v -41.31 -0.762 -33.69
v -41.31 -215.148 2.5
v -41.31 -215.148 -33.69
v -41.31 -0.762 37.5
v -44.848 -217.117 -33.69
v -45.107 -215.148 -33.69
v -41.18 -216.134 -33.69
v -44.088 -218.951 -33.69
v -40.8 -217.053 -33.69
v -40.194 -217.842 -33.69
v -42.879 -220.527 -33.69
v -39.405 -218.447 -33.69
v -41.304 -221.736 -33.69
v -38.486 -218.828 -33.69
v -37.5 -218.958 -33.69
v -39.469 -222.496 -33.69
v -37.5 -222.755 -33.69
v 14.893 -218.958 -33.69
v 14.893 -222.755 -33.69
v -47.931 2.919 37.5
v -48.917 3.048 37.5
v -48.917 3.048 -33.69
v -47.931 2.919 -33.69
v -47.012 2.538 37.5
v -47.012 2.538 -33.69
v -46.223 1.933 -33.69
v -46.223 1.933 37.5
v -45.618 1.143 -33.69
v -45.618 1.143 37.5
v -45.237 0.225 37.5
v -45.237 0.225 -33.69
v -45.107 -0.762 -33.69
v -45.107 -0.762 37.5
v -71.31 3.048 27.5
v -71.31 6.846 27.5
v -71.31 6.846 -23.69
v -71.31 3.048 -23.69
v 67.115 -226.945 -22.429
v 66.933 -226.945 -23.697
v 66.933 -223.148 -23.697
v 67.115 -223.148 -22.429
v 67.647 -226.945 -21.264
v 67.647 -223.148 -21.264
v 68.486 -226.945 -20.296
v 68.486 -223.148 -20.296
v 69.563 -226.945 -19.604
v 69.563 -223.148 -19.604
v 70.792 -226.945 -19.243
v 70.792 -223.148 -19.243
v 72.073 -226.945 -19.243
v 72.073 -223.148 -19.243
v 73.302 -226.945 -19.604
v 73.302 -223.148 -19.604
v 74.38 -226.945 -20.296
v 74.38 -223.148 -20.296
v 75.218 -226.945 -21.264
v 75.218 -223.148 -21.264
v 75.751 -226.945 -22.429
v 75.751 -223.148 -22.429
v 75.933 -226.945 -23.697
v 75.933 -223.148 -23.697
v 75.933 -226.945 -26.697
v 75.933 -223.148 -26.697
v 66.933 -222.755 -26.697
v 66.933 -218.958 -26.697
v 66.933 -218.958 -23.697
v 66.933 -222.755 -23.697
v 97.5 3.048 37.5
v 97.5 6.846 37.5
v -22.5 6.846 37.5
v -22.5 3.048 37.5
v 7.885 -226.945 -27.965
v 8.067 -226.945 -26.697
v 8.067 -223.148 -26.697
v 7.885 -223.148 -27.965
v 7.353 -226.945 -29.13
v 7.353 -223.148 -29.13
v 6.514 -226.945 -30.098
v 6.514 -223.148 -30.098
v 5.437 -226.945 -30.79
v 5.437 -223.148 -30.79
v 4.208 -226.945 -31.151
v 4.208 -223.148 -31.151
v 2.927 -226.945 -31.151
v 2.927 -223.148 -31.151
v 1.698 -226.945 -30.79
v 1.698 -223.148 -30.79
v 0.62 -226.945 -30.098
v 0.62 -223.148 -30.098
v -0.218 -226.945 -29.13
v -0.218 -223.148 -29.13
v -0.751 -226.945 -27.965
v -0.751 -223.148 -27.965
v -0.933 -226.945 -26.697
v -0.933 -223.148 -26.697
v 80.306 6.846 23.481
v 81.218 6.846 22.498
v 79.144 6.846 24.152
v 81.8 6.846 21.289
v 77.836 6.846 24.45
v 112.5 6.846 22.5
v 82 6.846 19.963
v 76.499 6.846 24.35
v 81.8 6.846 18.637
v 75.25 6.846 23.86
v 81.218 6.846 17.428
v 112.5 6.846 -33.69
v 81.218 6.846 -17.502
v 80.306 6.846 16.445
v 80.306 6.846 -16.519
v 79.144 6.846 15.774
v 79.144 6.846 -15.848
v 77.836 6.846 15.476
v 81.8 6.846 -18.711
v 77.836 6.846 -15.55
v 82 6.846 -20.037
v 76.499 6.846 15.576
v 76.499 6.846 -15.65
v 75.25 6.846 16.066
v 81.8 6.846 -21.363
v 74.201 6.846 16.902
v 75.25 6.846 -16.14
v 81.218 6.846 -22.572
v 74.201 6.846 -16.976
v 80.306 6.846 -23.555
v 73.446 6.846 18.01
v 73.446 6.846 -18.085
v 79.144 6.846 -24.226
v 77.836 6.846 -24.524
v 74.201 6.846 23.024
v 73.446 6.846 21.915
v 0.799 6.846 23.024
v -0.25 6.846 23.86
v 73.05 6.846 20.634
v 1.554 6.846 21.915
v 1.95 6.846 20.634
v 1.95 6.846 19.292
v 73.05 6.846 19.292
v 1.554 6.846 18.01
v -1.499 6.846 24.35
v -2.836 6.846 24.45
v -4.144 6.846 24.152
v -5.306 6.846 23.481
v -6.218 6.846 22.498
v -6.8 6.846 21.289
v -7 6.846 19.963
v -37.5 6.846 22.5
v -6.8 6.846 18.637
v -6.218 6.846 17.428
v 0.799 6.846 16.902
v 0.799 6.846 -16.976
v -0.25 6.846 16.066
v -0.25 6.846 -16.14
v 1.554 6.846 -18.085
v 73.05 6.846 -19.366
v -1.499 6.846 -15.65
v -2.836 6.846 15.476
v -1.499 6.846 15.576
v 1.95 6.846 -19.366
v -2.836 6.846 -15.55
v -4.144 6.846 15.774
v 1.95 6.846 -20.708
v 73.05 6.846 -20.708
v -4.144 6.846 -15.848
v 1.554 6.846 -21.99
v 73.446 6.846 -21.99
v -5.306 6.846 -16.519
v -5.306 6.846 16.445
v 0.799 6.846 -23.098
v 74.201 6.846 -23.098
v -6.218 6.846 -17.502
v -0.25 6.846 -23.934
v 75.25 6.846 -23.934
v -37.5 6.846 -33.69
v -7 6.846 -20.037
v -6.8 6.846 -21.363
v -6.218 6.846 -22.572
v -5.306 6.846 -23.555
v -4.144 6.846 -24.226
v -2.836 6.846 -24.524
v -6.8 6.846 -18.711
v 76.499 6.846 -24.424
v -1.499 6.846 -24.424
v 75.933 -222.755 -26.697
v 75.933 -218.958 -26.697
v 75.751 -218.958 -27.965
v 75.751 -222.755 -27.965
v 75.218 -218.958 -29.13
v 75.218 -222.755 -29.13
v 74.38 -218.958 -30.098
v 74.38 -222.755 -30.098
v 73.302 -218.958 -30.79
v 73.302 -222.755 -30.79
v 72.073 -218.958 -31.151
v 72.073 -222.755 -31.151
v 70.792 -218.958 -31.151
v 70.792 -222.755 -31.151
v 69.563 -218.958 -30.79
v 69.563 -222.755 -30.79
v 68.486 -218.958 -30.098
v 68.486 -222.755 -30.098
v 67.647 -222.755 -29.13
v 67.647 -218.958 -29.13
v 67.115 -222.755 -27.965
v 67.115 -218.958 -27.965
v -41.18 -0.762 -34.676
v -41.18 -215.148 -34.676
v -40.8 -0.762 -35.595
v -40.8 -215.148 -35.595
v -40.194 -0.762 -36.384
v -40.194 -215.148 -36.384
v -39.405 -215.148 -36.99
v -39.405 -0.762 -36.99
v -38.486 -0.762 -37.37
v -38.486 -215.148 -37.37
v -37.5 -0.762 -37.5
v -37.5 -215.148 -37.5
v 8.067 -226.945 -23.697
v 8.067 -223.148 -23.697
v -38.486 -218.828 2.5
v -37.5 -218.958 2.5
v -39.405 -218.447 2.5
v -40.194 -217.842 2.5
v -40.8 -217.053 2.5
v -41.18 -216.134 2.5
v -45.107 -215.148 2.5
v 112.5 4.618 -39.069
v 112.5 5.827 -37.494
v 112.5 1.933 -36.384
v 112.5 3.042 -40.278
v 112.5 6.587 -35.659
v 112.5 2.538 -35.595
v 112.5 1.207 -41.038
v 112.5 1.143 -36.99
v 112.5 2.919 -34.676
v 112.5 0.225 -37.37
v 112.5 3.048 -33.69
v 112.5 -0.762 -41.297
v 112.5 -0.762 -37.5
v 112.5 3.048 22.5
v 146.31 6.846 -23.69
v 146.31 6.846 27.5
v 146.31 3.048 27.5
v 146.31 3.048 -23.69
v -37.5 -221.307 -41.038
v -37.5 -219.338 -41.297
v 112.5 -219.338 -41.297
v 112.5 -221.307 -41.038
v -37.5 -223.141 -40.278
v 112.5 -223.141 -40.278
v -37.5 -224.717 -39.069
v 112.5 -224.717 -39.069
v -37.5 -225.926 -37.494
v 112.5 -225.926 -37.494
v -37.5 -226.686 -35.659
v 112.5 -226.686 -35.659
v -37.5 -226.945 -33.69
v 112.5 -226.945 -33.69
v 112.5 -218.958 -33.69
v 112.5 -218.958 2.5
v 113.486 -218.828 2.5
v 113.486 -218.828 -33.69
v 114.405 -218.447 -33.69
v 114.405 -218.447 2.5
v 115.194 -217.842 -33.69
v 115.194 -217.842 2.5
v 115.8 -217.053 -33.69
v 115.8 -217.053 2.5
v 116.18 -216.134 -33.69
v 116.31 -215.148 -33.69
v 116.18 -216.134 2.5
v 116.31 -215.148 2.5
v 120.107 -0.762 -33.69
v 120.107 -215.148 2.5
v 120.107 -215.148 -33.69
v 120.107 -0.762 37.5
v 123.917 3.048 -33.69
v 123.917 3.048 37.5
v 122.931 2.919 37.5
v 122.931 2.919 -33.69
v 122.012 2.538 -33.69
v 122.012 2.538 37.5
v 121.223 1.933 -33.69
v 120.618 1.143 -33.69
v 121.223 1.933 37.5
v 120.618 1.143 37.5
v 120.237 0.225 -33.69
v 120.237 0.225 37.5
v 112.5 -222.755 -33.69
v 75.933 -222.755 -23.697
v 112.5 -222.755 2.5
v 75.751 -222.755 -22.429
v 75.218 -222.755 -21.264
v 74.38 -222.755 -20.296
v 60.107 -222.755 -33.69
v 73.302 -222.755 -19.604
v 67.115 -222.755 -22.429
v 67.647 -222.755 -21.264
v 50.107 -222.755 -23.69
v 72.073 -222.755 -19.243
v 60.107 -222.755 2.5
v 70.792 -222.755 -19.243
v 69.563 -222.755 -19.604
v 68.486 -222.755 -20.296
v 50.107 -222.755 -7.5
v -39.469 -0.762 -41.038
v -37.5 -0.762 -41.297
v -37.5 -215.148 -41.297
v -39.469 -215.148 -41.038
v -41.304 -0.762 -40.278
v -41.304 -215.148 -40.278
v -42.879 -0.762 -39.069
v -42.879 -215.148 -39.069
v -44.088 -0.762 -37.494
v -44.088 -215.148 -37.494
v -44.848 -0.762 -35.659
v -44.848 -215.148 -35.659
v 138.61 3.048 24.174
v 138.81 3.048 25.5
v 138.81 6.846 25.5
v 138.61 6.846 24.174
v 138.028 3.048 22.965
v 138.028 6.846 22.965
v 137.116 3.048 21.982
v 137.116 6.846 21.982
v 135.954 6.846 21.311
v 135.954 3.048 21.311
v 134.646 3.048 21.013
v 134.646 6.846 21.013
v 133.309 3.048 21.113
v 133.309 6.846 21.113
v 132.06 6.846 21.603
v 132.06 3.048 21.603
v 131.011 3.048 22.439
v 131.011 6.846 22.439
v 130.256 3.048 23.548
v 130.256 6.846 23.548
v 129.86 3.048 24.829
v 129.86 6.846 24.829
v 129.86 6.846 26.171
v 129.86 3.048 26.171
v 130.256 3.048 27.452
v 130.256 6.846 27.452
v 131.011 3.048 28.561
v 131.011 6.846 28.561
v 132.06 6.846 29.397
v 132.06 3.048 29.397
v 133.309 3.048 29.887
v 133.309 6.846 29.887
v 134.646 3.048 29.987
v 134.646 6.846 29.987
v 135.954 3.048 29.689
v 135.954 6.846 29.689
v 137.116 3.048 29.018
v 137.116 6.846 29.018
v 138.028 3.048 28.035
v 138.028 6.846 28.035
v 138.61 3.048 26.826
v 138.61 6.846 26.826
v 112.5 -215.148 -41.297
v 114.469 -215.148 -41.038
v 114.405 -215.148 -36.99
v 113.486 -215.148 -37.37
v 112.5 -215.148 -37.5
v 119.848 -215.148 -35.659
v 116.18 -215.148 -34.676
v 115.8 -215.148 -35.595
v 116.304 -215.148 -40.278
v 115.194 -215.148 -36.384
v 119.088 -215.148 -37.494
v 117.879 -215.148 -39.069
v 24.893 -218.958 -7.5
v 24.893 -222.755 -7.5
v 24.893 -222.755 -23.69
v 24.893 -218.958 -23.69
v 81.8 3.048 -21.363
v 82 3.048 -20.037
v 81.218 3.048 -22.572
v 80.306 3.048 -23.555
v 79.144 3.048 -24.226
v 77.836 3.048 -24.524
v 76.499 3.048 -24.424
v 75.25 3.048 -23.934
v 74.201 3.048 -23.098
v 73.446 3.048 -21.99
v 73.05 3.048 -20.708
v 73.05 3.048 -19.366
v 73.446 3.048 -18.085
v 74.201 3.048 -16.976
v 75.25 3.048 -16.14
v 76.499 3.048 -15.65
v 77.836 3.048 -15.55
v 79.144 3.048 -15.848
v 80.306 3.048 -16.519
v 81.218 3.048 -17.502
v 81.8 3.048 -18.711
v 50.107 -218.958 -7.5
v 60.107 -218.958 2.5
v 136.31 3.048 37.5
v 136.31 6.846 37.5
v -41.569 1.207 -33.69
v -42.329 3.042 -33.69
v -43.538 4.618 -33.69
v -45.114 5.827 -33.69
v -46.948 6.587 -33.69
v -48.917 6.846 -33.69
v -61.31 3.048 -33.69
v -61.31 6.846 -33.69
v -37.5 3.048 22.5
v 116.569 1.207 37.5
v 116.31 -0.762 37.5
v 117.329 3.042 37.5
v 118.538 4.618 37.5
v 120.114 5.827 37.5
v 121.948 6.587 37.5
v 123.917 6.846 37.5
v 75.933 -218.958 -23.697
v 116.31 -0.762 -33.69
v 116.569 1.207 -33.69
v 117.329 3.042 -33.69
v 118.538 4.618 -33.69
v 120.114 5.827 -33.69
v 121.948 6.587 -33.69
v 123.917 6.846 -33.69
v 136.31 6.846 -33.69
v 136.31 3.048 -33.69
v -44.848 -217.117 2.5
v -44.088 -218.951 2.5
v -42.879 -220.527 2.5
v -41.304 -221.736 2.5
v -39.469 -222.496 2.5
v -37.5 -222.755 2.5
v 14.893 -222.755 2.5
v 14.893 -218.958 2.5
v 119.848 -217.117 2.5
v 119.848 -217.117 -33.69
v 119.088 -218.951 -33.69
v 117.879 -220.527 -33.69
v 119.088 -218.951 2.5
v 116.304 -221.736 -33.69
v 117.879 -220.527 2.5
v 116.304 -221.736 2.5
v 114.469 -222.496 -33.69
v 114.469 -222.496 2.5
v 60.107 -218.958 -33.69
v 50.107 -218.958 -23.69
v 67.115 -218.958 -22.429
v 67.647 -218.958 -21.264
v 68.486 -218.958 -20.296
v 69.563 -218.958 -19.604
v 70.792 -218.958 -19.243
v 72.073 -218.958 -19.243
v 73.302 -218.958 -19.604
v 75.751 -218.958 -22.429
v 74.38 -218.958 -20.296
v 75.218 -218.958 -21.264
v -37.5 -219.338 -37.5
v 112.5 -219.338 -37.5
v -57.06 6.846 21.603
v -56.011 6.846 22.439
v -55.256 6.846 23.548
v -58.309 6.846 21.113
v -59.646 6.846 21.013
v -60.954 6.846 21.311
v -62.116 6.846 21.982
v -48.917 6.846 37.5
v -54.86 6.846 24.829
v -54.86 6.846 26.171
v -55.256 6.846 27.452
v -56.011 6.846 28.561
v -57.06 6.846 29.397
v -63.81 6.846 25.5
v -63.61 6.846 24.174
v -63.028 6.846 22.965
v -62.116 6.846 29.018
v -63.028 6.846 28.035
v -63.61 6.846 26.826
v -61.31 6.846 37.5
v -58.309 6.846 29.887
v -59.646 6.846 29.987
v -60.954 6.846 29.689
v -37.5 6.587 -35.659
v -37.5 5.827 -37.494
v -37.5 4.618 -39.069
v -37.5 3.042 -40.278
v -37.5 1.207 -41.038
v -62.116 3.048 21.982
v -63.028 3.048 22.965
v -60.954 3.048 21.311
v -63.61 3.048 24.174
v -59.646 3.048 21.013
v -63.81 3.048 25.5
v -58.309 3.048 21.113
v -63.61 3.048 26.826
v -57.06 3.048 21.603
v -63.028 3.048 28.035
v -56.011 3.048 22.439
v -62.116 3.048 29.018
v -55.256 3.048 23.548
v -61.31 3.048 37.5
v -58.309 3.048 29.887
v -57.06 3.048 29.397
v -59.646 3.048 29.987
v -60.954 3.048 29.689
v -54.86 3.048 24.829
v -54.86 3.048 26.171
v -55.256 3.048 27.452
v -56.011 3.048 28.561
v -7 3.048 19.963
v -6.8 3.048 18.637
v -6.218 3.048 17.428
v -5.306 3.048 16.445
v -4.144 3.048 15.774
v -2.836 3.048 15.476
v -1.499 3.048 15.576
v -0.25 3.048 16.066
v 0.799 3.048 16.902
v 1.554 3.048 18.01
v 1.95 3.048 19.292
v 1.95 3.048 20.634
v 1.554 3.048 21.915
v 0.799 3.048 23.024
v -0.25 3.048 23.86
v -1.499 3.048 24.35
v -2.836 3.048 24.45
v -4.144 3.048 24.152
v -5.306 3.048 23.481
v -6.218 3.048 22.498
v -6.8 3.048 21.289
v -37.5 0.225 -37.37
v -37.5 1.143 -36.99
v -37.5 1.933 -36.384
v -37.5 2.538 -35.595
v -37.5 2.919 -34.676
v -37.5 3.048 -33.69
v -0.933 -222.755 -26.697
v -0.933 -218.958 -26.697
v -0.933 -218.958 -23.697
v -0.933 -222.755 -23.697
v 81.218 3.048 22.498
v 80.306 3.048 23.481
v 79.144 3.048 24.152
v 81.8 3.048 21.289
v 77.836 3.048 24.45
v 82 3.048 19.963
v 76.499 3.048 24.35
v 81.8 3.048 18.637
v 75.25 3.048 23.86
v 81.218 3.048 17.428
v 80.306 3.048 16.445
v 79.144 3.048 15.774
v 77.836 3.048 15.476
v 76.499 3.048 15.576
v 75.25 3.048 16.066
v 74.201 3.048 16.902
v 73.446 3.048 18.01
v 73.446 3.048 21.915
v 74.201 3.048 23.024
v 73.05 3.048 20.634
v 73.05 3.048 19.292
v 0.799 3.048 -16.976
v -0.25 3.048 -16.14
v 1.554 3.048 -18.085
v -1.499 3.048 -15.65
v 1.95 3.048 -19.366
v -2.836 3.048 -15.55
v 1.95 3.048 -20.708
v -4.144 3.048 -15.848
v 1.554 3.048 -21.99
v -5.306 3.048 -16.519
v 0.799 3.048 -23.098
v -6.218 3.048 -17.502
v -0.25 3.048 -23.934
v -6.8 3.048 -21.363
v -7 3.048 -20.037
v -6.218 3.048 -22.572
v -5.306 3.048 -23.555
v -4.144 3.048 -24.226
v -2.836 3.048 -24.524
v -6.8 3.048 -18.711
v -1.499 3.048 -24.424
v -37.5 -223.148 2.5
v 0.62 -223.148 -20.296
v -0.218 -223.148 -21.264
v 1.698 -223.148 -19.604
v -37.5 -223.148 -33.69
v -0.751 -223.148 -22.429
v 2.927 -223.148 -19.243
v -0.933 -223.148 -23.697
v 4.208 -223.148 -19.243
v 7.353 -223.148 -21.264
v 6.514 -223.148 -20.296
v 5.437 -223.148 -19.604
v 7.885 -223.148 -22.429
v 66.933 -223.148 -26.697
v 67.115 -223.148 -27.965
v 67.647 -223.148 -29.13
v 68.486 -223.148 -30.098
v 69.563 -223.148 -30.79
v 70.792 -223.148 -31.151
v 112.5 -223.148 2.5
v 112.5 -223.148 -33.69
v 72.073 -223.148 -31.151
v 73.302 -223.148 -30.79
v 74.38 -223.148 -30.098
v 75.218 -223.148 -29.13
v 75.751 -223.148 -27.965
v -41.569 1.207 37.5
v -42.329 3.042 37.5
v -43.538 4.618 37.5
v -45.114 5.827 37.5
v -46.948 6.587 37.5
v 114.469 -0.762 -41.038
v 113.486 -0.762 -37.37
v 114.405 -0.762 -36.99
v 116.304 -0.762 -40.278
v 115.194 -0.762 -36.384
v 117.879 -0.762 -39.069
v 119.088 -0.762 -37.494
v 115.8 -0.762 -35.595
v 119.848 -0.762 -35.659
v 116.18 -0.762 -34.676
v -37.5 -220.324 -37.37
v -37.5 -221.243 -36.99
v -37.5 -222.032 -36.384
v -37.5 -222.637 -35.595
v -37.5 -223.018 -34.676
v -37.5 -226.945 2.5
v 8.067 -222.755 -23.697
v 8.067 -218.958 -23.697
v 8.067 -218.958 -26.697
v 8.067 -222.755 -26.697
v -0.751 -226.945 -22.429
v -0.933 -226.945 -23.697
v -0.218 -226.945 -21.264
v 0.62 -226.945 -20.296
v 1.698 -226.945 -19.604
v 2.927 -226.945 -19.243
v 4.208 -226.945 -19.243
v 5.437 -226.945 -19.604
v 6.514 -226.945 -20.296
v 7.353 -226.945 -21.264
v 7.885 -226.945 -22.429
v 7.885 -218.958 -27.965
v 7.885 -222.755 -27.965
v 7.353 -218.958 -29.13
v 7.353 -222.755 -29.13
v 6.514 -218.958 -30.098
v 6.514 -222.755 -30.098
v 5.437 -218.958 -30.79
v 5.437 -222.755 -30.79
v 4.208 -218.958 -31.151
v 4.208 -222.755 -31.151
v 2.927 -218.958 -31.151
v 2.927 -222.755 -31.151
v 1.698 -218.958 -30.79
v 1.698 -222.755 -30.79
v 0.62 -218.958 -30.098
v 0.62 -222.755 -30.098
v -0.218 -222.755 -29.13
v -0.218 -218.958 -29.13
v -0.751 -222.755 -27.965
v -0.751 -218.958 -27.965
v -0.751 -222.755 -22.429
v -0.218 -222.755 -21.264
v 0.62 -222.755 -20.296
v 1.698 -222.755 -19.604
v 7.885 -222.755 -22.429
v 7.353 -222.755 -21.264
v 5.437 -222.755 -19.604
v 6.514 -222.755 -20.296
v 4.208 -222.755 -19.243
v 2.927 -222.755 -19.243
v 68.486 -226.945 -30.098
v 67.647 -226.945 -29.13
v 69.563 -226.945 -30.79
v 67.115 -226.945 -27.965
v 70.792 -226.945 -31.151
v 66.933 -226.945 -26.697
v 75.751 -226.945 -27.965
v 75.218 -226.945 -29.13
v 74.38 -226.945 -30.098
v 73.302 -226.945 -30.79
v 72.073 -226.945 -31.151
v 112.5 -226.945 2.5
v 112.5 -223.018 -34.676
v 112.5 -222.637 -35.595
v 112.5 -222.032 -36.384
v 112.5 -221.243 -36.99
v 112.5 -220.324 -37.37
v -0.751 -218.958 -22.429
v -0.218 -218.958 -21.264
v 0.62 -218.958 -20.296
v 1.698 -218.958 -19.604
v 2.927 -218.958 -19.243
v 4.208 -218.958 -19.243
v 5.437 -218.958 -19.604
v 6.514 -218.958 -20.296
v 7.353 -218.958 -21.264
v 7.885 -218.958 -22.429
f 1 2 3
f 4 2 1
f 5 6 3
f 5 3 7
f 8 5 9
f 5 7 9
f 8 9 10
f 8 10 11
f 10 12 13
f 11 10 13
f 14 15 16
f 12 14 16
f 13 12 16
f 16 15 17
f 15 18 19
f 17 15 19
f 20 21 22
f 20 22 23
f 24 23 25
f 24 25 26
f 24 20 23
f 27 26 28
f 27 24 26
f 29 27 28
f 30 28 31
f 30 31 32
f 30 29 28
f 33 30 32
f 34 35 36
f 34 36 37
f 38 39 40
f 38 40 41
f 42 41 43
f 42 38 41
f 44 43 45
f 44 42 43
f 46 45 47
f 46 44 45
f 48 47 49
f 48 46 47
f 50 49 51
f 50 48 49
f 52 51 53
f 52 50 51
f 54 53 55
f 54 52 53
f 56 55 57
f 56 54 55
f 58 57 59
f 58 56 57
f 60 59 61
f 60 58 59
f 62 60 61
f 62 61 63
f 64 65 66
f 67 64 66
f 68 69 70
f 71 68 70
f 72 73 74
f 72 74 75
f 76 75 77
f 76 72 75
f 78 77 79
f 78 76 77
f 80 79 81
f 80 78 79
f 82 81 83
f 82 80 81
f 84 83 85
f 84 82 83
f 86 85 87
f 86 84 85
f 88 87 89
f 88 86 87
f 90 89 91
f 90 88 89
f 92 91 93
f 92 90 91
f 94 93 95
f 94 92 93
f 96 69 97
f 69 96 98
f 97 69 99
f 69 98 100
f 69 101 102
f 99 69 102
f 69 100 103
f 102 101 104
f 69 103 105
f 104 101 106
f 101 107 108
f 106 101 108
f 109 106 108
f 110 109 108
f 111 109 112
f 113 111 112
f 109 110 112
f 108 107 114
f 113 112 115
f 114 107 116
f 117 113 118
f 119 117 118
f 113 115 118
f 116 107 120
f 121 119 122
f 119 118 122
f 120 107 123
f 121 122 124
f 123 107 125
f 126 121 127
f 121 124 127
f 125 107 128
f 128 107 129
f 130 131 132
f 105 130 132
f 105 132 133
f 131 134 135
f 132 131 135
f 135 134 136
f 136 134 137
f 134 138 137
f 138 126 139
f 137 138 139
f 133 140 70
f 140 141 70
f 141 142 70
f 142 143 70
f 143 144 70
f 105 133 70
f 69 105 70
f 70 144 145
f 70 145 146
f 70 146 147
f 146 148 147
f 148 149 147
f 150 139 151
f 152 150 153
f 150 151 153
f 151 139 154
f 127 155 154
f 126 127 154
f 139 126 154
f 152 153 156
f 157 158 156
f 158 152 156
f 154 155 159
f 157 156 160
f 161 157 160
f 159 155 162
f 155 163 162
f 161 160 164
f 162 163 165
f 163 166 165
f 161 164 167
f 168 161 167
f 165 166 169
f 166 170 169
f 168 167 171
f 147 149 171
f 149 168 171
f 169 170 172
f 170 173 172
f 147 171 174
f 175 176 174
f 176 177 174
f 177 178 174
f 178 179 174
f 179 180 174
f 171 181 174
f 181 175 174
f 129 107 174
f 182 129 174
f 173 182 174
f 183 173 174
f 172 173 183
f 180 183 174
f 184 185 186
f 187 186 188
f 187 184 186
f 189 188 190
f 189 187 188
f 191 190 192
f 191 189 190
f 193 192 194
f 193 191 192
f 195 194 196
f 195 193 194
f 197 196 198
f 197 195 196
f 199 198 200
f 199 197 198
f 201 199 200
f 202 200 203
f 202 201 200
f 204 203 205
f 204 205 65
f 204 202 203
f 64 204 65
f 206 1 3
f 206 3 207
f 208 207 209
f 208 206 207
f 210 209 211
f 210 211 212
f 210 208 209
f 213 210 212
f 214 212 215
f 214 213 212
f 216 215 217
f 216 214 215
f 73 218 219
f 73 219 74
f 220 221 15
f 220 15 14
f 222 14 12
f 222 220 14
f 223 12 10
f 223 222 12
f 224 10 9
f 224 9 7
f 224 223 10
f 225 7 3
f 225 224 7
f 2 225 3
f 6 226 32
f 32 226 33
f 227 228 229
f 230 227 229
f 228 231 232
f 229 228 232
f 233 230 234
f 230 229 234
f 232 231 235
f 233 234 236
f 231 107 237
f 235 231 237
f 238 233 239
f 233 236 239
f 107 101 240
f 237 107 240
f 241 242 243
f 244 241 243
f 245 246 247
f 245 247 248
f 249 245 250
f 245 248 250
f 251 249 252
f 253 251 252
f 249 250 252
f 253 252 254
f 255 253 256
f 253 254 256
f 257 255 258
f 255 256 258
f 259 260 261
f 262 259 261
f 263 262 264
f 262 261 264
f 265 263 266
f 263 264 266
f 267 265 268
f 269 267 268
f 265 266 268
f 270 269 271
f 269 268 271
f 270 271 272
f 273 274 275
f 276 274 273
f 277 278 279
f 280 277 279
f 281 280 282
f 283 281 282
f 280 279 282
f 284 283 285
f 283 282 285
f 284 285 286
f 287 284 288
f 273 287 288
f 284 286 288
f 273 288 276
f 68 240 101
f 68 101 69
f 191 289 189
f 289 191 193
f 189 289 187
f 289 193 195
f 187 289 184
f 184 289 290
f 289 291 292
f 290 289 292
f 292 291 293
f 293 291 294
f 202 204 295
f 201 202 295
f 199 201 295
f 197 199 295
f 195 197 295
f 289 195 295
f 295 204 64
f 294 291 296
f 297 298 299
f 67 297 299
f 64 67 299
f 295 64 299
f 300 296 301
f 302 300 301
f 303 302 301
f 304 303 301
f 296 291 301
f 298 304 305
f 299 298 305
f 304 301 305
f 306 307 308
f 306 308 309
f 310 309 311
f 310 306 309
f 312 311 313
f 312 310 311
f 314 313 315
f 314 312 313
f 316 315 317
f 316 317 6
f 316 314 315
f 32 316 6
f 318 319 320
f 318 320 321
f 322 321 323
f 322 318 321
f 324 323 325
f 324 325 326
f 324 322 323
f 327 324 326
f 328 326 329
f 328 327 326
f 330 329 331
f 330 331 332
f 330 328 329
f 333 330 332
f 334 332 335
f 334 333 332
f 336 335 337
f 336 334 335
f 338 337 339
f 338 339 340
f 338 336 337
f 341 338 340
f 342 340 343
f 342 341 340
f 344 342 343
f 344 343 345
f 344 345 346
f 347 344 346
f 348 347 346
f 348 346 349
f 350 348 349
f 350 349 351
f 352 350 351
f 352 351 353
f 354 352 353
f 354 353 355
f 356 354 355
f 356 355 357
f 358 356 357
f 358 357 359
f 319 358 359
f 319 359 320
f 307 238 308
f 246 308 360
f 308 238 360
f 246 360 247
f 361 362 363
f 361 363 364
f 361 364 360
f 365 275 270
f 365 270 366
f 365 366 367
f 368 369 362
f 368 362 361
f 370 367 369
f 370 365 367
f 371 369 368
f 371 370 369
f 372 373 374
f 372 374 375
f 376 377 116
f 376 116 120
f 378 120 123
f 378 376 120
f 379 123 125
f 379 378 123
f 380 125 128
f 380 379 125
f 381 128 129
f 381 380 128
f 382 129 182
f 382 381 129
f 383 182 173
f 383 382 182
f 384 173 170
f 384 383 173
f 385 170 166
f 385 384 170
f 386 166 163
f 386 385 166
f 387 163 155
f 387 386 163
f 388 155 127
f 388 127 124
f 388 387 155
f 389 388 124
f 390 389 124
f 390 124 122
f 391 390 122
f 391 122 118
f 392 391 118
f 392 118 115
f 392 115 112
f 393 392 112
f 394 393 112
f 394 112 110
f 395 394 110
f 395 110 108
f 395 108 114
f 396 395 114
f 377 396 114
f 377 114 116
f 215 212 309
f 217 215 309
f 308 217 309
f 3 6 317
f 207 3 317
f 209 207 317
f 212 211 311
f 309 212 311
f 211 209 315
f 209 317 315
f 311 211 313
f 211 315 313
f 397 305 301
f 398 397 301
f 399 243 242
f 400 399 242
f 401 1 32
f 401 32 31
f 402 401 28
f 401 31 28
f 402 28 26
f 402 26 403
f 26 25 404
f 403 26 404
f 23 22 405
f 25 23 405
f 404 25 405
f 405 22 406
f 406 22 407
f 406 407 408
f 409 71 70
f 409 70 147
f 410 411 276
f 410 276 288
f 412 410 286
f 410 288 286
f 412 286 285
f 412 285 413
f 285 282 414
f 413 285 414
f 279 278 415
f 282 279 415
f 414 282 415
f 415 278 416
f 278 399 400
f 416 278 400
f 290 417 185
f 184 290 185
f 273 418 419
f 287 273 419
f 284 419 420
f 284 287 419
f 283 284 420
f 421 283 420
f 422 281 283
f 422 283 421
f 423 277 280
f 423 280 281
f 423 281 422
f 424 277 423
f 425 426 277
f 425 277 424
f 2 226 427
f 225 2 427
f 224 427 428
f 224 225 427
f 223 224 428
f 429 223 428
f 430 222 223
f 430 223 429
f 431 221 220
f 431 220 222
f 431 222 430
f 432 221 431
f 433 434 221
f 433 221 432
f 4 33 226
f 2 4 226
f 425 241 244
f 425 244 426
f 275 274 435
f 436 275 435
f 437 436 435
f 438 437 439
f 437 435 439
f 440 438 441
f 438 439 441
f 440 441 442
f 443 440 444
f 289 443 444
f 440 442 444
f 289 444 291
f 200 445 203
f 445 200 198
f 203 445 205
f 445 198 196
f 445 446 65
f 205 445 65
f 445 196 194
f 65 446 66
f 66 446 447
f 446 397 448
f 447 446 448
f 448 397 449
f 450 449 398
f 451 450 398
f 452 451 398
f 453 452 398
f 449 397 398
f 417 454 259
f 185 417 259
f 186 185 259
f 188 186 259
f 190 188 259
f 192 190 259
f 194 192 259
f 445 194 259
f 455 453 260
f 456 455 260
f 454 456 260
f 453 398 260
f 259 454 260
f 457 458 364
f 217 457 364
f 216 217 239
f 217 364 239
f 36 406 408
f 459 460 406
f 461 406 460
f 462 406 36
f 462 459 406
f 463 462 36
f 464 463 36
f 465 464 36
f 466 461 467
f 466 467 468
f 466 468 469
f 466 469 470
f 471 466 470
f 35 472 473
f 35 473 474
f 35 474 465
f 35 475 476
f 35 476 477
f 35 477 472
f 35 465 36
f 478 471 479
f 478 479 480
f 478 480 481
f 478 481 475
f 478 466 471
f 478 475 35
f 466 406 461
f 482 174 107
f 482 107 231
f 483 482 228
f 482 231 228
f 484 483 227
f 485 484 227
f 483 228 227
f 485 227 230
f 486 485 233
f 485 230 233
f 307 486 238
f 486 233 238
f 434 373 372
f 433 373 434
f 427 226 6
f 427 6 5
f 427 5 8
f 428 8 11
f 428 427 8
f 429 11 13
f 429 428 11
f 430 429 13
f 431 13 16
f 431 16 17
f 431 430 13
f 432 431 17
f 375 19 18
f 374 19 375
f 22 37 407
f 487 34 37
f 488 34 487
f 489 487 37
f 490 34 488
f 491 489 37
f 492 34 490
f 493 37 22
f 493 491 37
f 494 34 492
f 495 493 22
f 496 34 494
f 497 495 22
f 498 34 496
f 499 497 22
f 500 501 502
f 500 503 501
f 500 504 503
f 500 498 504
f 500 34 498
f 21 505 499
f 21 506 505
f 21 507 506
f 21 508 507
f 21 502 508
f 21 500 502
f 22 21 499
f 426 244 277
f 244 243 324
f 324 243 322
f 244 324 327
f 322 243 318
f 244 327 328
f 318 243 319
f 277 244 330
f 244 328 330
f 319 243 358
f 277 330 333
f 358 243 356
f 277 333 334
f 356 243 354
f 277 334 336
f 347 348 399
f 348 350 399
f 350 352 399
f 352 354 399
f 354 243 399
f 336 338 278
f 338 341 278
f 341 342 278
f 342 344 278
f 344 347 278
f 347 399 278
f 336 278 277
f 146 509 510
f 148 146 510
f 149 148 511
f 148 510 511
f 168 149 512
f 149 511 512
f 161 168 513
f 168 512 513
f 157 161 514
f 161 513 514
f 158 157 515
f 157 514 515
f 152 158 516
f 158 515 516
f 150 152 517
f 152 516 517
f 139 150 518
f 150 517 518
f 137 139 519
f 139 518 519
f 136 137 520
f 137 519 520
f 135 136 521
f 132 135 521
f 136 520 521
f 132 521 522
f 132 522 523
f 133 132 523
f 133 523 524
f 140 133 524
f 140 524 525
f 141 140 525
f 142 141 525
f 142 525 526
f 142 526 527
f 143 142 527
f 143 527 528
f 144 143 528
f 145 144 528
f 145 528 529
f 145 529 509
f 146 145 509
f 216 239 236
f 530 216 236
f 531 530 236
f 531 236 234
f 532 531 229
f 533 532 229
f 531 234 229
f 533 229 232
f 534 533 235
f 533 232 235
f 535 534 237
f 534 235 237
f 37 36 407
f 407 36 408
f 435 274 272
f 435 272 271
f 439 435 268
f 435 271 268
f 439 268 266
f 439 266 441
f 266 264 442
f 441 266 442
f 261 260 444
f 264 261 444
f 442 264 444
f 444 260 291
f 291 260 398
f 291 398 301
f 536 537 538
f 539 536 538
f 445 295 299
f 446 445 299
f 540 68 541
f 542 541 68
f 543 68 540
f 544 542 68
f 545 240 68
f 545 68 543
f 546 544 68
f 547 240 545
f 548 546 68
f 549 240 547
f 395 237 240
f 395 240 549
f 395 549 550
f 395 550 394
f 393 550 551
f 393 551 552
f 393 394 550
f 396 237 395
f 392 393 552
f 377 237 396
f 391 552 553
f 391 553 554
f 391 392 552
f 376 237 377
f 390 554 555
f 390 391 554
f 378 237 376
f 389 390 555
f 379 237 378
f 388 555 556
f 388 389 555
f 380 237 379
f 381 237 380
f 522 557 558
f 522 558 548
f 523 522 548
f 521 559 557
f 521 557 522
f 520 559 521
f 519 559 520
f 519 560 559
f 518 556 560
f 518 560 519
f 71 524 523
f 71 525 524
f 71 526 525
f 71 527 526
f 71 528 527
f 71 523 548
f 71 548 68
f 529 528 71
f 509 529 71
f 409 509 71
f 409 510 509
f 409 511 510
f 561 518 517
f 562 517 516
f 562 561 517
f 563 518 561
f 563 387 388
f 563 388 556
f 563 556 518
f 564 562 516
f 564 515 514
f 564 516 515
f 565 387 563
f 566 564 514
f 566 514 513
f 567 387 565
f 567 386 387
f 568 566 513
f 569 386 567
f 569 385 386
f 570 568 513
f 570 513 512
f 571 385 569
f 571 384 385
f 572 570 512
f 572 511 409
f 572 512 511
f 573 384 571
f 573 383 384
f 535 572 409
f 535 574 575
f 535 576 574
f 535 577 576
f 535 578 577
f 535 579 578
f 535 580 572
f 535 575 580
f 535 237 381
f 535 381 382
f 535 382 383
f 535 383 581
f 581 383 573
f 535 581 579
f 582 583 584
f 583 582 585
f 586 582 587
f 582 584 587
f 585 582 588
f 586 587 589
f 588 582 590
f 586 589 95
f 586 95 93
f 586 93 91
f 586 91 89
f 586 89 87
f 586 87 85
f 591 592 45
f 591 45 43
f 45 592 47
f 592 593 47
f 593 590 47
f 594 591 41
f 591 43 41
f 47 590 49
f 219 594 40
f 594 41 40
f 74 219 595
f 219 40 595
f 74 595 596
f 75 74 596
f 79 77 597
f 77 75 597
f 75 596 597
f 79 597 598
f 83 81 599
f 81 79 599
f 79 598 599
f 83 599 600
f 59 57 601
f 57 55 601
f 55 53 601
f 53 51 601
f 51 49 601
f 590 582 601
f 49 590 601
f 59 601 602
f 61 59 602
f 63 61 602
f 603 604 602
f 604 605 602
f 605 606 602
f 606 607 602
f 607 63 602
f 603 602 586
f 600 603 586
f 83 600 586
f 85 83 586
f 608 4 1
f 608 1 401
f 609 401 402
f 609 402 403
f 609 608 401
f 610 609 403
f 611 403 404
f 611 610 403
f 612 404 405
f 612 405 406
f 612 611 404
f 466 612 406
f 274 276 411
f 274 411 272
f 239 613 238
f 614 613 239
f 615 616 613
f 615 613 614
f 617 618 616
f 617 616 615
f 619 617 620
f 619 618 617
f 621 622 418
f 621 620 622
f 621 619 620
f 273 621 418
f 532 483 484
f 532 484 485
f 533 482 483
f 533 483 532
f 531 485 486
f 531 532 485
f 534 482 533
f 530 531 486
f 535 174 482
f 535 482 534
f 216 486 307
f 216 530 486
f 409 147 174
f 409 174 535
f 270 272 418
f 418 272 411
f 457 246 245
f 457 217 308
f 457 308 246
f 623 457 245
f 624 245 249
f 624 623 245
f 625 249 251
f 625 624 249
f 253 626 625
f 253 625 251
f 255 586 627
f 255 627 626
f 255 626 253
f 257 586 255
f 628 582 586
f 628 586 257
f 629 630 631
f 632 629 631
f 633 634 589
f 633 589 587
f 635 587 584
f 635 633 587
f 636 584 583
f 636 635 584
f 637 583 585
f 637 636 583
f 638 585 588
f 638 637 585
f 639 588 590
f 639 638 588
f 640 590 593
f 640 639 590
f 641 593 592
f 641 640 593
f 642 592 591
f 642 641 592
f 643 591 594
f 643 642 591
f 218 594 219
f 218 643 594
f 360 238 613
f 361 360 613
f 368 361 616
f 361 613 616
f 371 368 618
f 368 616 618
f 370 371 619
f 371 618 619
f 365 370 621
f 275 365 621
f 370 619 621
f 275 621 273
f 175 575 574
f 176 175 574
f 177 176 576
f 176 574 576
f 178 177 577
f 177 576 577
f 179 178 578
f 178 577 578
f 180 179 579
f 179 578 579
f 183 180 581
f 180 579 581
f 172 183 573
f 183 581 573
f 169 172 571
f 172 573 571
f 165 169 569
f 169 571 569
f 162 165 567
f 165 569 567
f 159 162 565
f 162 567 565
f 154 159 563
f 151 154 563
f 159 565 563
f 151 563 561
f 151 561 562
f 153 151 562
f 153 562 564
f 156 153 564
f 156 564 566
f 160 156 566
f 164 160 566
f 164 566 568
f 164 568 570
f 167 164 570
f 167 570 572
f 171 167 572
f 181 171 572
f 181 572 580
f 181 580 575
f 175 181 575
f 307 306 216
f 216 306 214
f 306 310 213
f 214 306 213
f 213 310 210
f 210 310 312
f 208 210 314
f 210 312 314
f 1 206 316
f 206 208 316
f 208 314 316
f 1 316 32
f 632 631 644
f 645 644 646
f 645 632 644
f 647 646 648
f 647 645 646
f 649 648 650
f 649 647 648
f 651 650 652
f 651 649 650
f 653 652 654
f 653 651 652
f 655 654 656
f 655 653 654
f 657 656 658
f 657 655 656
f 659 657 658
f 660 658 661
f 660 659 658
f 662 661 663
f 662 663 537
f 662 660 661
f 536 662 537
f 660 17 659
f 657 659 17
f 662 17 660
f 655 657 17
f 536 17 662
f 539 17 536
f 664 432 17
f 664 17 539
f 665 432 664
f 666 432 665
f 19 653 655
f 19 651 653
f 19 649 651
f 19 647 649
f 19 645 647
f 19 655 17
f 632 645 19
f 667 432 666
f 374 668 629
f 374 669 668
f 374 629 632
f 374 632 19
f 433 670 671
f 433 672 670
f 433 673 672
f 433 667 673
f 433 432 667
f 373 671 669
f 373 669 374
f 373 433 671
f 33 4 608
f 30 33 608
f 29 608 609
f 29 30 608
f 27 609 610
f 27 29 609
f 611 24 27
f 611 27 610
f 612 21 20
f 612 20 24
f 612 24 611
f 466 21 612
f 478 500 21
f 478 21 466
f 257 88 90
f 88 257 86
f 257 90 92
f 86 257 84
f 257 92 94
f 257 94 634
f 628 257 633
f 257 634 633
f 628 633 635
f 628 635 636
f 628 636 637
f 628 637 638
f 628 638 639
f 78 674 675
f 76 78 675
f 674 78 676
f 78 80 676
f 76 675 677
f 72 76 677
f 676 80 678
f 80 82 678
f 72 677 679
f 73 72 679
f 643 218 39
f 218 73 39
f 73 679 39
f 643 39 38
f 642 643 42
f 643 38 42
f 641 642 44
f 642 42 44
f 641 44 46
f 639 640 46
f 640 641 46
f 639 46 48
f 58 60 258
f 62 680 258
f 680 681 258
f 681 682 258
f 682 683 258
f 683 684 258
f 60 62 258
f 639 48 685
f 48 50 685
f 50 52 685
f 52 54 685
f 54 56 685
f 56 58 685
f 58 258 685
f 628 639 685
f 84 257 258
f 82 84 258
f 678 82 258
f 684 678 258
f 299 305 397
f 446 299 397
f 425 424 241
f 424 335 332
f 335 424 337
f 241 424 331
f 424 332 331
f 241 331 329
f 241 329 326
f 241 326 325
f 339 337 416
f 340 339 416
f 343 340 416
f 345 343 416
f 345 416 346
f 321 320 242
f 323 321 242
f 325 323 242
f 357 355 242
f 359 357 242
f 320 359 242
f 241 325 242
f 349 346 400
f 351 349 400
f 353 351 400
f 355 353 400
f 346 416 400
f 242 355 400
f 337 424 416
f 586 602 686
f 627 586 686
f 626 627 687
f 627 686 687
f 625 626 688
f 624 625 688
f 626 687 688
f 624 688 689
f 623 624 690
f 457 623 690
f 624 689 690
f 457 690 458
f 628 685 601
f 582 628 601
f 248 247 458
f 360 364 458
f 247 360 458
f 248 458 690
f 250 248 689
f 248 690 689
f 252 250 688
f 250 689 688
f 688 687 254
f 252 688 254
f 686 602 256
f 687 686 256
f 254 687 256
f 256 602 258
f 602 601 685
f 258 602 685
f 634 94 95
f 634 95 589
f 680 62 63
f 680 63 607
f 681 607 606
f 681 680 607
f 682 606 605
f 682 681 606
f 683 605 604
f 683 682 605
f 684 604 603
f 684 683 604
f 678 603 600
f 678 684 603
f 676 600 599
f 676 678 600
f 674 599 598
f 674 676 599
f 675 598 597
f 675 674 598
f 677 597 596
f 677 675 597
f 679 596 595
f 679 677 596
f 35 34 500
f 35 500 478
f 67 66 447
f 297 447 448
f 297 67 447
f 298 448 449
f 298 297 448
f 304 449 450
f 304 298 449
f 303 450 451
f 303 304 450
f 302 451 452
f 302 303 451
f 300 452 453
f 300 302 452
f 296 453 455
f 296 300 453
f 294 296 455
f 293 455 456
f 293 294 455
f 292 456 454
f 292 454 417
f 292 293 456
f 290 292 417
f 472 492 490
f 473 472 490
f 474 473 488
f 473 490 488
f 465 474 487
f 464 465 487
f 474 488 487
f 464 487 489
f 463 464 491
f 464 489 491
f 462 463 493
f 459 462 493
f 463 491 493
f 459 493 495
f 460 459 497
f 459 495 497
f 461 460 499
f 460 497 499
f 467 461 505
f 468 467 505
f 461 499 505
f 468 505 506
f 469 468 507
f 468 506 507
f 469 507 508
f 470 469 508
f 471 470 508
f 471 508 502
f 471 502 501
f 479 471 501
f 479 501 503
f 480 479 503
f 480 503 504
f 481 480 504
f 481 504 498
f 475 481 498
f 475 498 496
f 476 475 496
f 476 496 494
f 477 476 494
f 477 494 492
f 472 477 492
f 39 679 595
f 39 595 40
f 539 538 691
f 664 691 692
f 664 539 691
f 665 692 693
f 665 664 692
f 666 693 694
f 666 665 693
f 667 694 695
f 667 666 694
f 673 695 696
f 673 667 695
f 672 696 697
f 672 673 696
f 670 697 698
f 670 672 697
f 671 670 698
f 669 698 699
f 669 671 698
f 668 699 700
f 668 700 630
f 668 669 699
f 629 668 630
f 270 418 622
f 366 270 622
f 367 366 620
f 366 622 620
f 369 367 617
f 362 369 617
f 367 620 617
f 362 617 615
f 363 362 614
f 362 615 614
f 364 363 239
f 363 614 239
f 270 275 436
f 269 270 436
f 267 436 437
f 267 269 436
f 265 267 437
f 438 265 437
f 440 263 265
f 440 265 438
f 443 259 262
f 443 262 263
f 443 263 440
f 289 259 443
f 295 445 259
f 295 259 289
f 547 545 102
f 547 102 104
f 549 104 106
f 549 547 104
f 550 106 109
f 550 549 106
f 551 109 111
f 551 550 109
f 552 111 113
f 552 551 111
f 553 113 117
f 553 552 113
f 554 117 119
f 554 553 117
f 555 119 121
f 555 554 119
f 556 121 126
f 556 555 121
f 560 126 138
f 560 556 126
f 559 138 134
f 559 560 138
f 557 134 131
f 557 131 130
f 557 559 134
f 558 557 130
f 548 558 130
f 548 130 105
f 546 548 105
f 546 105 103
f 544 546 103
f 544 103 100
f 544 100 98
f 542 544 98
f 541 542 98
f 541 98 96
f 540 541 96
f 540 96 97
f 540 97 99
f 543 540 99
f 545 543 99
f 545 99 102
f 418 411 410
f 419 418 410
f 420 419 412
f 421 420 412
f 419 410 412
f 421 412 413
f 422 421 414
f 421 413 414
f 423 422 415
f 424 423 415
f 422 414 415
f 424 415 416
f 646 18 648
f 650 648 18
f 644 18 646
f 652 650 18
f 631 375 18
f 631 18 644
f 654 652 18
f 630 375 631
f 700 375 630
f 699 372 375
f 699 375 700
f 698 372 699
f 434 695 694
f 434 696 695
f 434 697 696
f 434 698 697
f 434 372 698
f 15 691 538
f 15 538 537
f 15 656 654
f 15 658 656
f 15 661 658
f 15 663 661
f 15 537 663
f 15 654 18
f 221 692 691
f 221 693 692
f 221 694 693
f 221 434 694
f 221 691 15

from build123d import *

# Parameters (mm, degrees)
SKETCH1_W                    = 75
SKETCH1_H                    = 75
BASE_FLANGE1_DEPTH           = 3.7973
EDGE_FLANGE1_STRIP_W         = 22.8092
EDGE_FLANGE1_STRIP_H         = 3.7973
EDGE_FLANGE1_STRIP_CUT_DEPTH = 75
EDGE_FLANGE1_DEPTH           = 75
EDGE_FLANGE2_STRIP_W         = 22.8092
EDGE_FLANGE2_STRIP_H         = 3.7973
EDGE_FLANGE2_STRIP_CUT_DEPTH = 75
EDGE_FLANGE2_DEPTH           = 75
EDGE_FLANGE3_DEPTH           = 214.38618
EDGE_FLANGE3_START           = -3.7973
EDGE_FLANGE3_FLAT_DEPTH      = 3.7973
EDGE_FLANGE4_DEPTH           = 71.19
EDGE_FLANGE5_DEPTH           = 36.19
BREAK_CORNER1_START          = -222.755
BREAK_CORNER1_DEPTH          = 3.7973
BREAK_CORNER2_START          = -74.246212025
BREAK_CORNER2_OUTLINE_W      = 51.869221049
BREAK_CORNER2_OUTLINE_H      = 3.7973
BREAK_CORNER2_DEPTH          = 7.071067812
BREAK_CORNER2_START_2        = -30.978348084
BREAK_CORNER2_2_OUTLINE_W    = 7.130778951
BREAK_CORNER2_2_OUTLINE_H    = 3.7973
BREAK_CORNER2_2_DEPTH        = 14.142135624
M8_CLEARANCE_HOLE1_D         = 9
M8_CLEARANCE_HOLE1_DEPTH     = 13
M8_CLEARANCE_HOLE1_TIP       = 2.703872786
BREAK_CORNER3_START          = 3.04848
BREAK_CORNER3_DEPTH          = 3.7973
M8_START                     = -226.945
M8_CLEARANCE_SLOT1_DEPTH     = 7.9873


# Read off the part's stored shape, not the designer's step: Break-Corner1, Break-Corner2, Break-Corner3, M8 Clearance Slot1
# Sheet-metal steps are written as plain solids
with BuildPart() as part:
    # Sketch1 → Base-Flange1 (new body)
    with BuildSketch(Plane(origin=(0, 6.84578, 0), x_dir=(1, 0, 0), z_dir=(0, 1, 0))):
        Rectangle(SKETCH1_W, SKETCH1_H)
    extrude(amount=-BASE_FLANGE1_DEPTH)

    # Edge-Flange1 strip (across the edge) → Edge-Flange1 strip cut (cut)
    with BuildSketch(Plane(origin=(-37.5, 3.04848, -37.5), x_dir=(0, 0, 1), z_dir=(1, 0, 0))):
        with Locations((-7.5946, -1.89865)):
            Rectangle(EDGE_FLANGE1_STRIP_W, EDGE_FLANGE1_STRIP_H)
    extrude(amount=EDGE_FLANGE1_STRIP_CUT_DEPTH, mode=Mode.SUBTRACT)

    # Edge-Flange1 section (across the edge) → Edge-Flange1 (add)
    with BuildSketch(Plane(origin=(-37.5, 3.04848, -37.5), x_dir=(0, 0, 1), z_dir=(1, 0, 0))):
        with BuildLine():
            Line((-3.7973, 3.81), (-3.7973, 229.99348))
            Line((-3.7973, 229.99348), (0, 229.99348))
            Line((0, 229.99348), (0, 3.81))
            ThreePointArc((0, 3.81), (1.115923164, 1.115923164), (3.81, 0))
            Line((3.81, 0), (3.81, -3.7973))
            ThreePointArc((3.81, -3.7973), (-1.569173417, -1.569173417), (-3.7973, 3.81))
        make_face()
    extrude(amount=EDGE_FLANGE1_DEPTH)

    # Edge-Flange2 strip (across the edge) → Edge-Flange2 strip cut (cut)
    with BuildSketch(Plane(origin=(-37.5, -226.945, -37.5), x_dir=(0, 1, 0), z_dir=(1, 0, 0))):
        with Locations((-3.7973, -1.89865)):
            Rectangle(EDGE_FLANGE2_STRIP_W, EDGE_FLANGE2_STRIP_H)
    extrude(amount=EDGE_FLANGE2_STRIP_CUT_DEPTH, mode=Mode.SUBTRACT)

    # Edge-Flange2 section (across the edge) → Edge-Flange2 (add)
    with BuildSketch(Plane(origin=(-37.5, -226.945, -37.5), x_dir=(0, 1, 0), z_dir=(1, 0, 0))):
        with BuildLine():
            Line((0, 3.81), (0, 40))
            Line((0, 40), (3.7973, 40))
            Line((3.7973, 40), (3.7973, 3.81))
            ThreePointArc((3.7973, 3.81), (4.913223164, 1.115923164), (7.6073, 0))
            Line((7.6073, 0), (7.6073, -3.7973))
            ThreePointArc((7.6073, -3.7973), (2.228126583, -1.569173417), (0, 3.81))
        make_face()
    extrude(amount=EDGE_FLANGE2_DEPTH)

    # Edge-Flange3 bend section (across the edge) → Edge-Flange3 (add)
    with BuildSketch(Plane(origin=(-41.31, -0.76152, -37.5), x_dir=(1, 0, 0), z_dir=(0, -1, 0))):
        with BuildLine():
            Line((-3.7973, 3.81), (0, 3.81))
            ThreePointArc((0, 3.81), (1.115923164, 1.115923164), (3.81, 0))
            Line((3.81, 0), (3.81, -3.7973))
            ThreePointArc((3.81, -3.7973), (-1.569173417, -1.569173417), (-3.7973, 3.81))
        make_face()
    extrude(amount=EDGE_FLANGE3_DEPTH)

    # Edge-Flange3 profile (on flange) → Edge-Flange3 flat (add)
    with BuildSketch(Plane(origin=(-41.31, 0, -37.5), x_dir=(0, 1, 0), z_dir=(1, 0, 0)).offset(EDGE_FLANGE3_START)):
        Polygon((-215.1477, 3.81), (-0.76152, 3.81), (-0.76152, 75), (-215.1477, 40), align=None)
    extrude(amount=EDGE_FLANGE3_FLAT_DEPTH)

    # Edge-Flange4 section (across the edge) → Edge-Flange4 (add)
    with BuildSketch(Plane(origin=(-45.1073, 3.04848, 37.5), x_dir=(0, -1, 0), z_dir=(0, 0, -1))):
        with BuildLine():
            Line((-3.7973, 3.81), (-3.7973, 26.2027))
            Line((-3.7973, 26.2027), (0, 26.2027))
            Line((0, 26.2027), (0, 3.81))
            ThreePointArc((0, 3.81), (1.115923164, 1.115923164), (3.81, 0))
            Line((3.81, 0), (3.81, -3.7973))
            ThreePointArc((3.81, -3.7973), (-1.569173417, -1.569173417), (-3.7973, 3.81))
        make_face()
    extrude(amount=EDGE_FLANGE4_DEPTH)

    # Edge-Flange5 section (across the edge) → Edge-Flange5 (add)
    with BuildSketch(Plane(origin=(-41.31, -218.9577, 2.5), x_dir=(0, 1, 0), z_dir=(0, 0, -1))):
        with BuildLine():
            Line((-3.7973, 3.81), (-3.7973, 66.2027))
            Line((-3.7973, 66.2027), (0, 66.2027))
            Line((0, 66.2027), (0, 3.81))
            ThreePointArc((0, 3.81), (1.115923164, 1.115923164), (3.81, 0))
            Line((3.81, 0), (3.81, -3.7973))
            ThreePointArc((3.81, -3.7973), (-1.569173417, -1.569173417), (-3.7973, 3.81))
        make_face()
    extrude(amount=EDGE_FLANGE5_DEPTH)

    # Break-Corner1 outline → Break-Corner1 (cut)
    with BuildSketch(Plane(origin=(0, 0, 0), x_dir=(1, 0, 0), z_dir=(0, 1, 0)).offset(BREAK_CORNER1_START)):
        Polygon((24.8927, -2.5), (24.8927, 7.5), (14.8927, -2.5), align=None)
        Polygon((14.8927, 33.69), (24.8927, 23.69), (24.8927, 33.69), align=None)
    extrude(amount=BREAK_CORNER1_DEPTH, mode=Mode.SUBTRACT)

    # Break-Corner2 outline → Break-Corner2 (cut)
    with BuildSketch(Plane(origin=(0, 0, 0), x_dir=(0.707106781186549, 0, -0.707106781186546), z_dir=(0.707106781186546, 0, 0.707106781186549)).offset(BREAK_CORNER2_START)):
        with Locations((-43.934610525, 4.94713)):
            Rectangle(BREAK_CORNER2_OUTLINE_W, BREAK_CORNER2_OUTLINE_H)
    extrude(amount=BREAK_CORNER2_DEPTH, mode=Mode.SUBTRACT)

    # Break-Corner2 2 outline → Break-Corner2 2 (cut)
    with BuildSketch(Plane(origin=(0, 0, 0), x_dir=(0.707106781186549, 0, -0.707106781186546), z_dir=(0.707106781186546, 0, 0.707106781186549)).offset(BREAK_CORNER2_START_2)):
        with Locations((-73.434610525, 4.94713)):
            Rectangle(BREAK_CORNER2_2_OUTLINE_W, BREAK_CORNER2_2_OUTLINE_H)
    extrude(amount=BREAK_CORNER2_2_DEPTH, mode=Mode.SUBTRACT)

    # M8 Clearance Hole1
    with Locations(Plane(origin=(0, 6.84578, 0), x_dir=(1, 0, 0), z_dir=(0, 1, 0))):
        with Locations((-2.5, -19.962925734), (-2.5, 20.037074266), (-59.31, -25.5)):
            Hole(M8_CLEARANCE_HOLE1_D / 2, depth=M8_CLEARANCE_HOLE1_DEPTH)
            with Locations((0, 0, -(M8_CLEARANCE_HOLE1_DEPTH + M8_CLEARANCE_HOLE1_TIP / 2))):  # 118° drill point
                Cone(0, M8_CLEARANCE_HOLE1_D / 2, M8_CLEARANCE_HOLE1_TIP, mode=Mode.SUBTRACT)

    # Mirror1: part across plane


with BuildPart() as part_1:
    add(part.part)
    add(part.part.mirror(Plane(origin=(37.5, 3.04848, -41.2973), x_dir=(0, 0, 1), z_dir=(1, 0, 0))))

    # Break-Corner3 outline → Break-Corner3 (cut)
    with BuildSketch(Plane(origin=(0, 0, 0), x_dir=(1, 0, 0), z_dir=(0, 1, 0)).offset(BREAK_CORNER3_START)):
        Polygon((-37.5, -37.5), (-22.5, -37.5), (-37.5, -22.5), align=None)
        Polygon((112.5, -22.5), (97.5, -37.5), (112.5, -37.5), align=None)
    extrude(amount=BREAK_CORNER3_DEPTH, mode=Mode.SUBTRACT)

    # M8 Clearance Slot1 outline → M8 Clearance Slot1 (cut)
    with BuildSketch(Plane(origin=(0, 0, 0), x_dir=(1, 0, 0), z_dir=(0, 1, 0)).offset(M8_START)):
        with BuildLine():
            ThreePointArc((-0.9328125, 23.696875), (3.5671875, 19.196875), (8.0671875, 23.696875))
            Line((8.0671875, 23.696875), (8.0671875, 26.696875))
            ThreePointArc((8.0671875, 26.696875), (3.5671875, 31.196875), (-0.9328125, 26.696875))
            Line((-0.9328125, 26.696875), (-0.9328125, 23.696875))
        make_face()
        with BuildLine():
            ThreePointArc((66.9328125, 23.696875), (71.4328125, 19.196875), (75.9328125, 23.696875))
            Line((75.9328125, 23.696875), (75.9328125, 26.696875))
            ThreePointArc((75.9328125, 26.696875), (71.4328125, 31.196875), (66.9328125, 26.696875))
            Line((66.9328125, 26.696875), (66.9328125, 23.696875))
        make_face()
    extrude(amount=M8_CLEARANCE_SLOT1_DEPTH, mode=Mode.SUBTRACT)


solid = part_1.part
